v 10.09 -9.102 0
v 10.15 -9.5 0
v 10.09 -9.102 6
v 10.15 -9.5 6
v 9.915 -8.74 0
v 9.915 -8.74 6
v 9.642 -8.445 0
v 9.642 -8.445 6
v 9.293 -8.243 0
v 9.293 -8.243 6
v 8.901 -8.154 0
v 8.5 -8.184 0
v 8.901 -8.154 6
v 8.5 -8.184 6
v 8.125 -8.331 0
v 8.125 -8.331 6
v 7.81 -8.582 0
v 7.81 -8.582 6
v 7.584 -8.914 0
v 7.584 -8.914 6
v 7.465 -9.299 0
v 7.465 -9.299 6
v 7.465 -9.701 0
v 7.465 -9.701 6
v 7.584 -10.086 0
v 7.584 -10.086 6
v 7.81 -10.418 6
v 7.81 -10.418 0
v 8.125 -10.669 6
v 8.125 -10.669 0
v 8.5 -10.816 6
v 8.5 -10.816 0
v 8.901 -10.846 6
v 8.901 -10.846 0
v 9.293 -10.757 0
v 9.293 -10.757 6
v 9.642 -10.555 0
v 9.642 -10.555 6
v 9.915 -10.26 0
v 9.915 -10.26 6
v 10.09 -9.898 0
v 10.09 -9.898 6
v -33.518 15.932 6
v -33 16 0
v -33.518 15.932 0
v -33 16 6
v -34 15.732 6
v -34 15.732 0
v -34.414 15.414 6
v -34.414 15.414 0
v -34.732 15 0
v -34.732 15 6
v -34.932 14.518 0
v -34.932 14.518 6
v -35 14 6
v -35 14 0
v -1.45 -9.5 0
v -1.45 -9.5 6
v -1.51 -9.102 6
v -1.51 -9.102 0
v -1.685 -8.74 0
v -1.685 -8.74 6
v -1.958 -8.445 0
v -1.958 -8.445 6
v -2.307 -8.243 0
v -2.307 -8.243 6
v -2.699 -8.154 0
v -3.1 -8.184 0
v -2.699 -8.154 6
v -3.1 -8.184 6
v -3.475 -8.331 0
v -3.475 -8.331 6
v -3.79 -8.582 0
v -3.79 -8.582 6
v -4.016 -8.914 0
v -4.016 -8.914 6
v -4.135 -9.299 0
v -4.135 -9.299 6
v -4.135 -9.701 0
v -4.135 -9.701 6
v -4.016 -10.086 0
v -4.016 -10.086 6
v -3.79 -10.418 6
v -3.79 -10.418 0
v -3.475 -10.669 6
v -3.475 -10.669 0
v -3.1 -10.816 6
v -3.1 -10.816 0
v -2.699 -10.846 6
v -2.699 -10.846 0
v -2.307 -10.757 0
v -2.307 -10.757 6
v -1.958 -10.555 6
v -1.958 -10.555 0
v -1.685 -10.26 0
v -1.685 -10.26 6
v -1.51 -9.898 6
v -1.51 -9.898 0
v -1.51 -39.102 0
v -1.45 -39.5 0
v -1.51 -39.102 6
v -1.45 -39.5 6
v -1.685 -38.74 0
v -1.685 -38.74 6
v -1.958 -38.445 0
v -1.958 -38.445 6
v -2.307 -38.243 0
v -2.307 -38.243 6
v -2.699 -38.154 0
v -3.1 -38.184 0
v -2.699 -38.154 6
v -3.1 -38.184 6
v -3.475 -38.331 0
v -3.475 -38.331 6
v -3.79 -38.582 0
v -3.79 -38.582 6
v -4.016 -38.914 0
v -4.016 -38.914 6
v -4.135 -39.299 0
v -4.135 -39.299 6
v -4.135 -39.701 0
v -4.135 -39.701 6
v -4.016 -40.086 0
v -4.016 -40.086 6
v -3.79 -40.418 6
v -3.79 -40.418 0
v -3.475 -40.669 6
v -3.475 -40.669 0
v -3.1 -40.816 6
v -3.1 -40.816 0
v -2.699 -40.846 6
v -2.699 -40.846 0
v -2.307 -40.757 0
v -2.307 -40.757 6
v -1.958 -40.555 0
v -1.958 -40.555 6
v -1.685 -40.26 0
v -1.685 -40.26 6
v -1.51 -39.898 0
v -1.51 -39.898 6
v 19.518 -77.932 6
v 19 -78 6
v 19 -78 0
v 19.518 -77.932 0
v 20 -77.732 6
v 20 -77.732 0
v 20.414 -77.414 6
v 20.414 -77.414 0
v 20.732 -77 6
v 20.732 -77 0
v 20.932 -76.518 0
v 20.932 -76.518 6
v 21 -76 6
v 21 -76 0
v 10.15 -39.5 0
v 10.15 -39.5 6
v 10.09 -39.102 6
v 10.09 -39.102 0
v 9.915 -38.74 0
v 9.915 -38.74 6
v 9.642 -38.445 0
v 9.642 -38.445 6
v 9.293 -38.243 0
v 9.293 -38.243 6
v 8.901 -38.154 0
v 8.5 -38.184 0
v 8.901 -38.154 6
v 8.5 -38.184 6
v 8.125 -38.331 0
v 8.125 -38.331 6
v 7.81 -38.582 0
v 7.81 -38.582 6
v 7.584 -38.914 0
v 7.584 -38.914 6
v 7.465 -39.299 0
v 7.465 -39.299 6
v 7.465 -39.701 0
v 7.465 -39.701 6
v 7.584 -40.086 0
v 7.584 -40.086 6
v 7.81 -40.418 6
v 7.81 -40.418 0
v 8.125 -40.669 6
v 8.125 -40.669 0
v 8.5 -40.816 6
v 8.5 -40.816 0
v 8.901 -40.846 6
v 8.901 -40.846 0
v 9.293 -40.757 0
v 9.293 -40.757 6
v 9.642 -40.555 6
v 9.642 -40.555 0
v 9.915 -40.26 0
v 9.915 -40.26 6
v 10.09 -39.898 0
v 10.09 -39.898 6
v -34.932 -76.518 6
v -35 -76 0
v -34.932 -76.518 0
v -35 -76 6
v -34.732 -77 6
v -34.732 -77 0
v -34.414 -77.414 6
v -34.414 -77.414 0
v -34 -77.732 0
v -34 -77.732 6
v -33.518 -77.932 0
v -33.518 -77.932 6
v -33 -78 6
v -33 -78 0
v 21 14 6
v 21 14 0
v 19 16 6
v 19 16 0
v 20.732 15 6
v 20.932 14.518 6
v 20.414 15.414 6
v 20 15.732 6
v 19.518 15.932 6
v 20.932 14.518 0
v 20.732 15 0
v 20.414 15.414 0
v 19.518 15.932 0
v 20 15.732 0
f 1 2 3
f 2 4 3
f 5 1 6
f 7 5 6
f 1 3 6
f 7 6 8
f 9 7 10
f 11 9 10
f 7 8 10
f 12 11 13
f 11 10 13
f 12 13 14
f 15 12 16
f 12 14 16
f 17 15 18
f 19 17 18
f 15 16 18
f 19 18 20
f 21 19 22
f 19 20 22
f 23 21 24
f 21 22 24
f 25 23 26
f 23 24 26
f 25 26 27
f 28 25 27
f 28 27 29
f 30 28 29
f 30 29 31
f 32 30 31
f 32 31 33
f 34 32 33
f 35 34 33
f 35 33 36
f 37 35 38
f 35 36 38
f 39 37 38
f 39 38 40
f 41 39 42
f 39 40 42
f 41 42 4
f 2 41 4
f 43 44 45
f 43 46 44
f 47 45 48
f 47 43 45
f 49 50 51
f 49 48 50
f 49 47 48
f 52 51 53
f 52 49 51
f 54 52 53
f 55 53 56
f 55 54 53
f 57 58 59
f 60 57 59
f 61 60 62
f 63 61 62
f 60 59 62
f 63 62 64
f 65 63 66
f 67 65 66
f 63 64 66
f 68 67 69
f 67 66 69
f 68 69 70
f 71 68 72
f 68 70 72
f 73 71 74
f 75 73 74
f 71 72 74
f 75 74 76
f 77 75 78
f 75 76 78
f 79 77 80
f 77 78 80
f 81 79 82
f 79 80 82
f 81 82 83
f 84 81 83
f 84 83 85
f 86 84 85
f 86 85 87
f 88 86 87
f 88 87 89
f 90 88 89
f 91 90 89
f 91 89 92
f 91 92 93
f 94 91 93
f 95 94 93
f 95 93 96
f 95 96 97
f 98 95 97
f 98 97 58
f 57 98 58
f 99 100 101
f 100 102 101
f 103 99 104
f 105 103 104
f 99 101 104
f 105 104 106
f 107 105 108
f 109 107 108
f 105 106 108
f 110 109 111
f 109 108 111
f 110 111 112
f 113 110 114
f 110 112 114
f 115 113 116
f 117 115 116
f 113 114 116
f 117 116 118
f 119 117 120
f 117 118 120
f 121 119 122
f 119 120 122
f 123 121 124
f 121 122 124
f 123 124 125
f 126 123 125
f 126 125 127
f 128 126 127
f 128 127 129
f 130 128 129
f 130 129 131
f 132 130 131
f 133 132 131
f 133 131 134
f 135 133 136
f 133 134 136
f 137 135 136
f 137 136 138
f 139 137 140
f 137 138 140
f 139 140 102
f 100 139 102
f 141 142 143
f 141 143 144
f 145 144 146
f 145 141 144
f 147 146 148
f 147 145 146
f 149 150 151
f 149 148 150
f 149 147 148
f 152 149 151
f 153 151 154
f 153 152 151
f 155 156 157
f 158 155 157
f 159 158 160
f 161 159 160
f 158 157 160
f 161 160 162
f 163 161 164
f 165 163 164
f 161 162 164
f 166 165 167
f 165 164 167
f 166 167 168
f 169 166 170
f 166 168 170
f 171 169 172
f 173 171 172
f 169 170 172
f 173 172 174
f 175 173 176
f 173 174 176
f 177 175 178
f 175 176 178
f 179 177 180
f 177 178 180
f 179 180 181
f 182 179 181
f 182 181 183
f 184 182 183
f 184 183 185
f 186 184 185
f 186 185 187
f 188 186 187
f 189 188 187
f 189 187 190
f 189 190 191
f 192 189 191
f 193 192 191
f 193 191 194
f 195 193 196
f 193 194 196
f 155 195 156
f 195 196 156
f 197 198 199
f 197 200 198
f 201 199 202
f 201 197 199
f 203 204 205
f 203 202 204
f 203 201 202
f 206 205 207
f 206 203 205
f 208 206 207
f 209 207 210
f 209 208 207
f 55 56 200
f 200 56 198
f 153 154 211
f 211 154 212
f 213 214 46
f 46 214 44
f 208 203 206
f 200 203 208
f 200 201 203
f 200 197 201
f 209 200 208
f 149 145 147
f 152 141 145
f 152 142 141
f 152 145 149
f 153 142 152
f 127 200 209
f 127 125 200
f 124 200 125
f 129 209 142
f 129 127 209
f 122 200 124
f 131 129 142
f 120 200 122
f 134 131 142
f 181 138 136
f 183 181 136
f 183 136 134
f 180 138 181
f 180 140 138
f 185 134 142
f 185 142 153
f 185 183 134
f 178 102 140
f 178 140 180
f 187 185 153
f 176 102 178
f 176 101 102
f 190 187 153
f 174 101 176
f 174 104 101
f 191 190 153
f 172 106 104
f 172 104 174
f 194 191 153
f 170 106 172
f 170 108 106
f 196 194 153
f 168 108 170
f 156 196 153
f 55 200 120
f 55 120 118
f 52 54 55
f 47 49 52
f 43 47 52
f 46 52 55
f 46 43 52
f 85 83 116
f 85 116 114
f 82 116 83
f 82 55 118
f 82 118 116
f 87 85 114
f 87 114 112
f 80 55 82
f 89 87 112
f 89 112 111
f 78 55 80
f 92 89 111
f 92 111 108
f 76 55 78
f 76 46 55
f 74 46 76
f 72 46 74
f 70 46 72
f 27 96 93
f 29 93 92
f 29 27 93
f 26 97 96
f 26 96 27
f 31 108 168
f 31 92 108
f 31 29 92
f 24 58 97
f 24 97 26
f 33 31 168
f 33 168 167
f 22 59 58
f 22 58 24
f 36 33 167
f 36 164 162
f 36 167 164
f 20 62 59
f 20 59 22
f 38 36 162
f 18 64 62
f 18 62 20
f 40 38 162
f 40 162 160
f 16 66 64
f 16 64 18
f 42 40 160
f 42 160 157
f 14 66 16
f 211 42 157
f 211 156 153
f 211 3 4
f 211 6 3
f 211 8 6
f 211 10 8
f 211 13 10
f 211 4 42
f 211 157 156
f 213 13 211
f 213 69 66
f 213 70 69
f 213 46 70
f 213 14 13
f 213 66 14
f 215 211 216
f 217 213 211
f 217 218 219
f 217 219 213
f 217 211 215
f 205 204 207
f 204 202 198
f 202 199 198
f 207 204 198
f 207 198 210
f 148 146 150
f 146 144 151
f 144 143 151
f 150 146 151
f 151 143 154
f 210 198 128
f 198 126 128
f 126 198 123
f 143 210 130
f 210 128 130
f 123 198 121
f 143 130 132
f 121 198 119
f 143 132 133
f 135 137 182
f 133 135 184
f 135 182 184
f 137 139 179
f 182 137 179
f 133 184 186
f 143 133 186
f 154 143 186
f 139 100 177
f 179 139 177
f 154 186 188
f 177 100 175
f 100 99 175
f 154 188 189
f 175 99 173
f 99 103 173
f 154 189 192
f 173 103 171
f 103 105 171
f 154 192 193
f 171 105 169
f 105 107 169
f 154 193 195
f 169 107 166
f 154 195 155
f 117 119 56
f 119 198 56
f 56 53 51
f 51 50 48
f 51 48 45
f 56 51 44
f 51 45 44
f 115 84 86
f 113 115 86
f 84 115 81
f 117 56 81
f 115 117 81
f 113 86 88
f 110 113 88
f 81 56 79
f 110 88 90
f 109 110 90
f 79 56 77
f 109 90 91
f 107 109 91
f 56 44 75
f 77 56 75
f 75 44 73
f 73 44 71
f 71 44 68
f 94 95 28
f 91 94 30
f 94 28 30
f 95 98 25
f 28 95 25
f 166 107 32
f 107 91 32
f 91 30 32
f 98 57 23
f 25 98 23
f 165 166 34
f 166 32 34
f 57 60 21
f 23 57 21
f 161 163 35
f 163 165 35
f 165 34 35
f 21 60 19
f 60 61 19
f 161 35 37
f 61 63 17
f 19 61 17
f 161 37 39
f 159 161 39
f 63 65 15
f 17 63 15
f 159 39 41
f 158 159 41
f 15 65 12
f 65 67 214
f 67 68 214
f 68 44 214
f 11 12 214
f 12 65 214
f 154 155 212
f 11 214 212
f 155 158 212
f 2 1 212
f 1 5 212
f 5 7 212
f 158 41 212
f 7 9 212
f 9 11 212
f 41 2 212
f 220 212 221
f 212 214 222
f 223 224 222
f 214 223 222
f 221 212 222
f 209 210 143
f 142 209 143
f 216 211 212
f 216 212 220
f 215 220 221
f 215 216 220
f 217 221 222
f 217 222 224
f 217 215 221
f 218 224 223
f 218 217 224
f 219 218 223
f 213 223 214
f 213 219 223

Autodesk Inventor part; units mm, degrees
ref_plane "YZ Plane" through (0, 0, 0) normal (1, 0, 0) x (0, 1, 0)
ref_plane "XZ Plane" through (0, 0, 0) normal (0, 1, 0) x (-1, 0, 0)
ref_plane "XY Plane" through (0, 0, 0) normal (0, 0, 1) x (1, 0, 0)
sketch "스케치1" plane through (0, 0, 0) normal (0, 0, 1) x (1, 0, 0)
  circle A0 centre (11, 3) radius 1.35 projected
  circle A1 centre (-5, 3) radius 1.35 projected
  line L0 (0, 0) -> (6, 0) projected
  line L1 (6, 0) -> (6, 6) projected
  line L2 (0, 6) -> (6, 6) projected
  line L3 (0, 0) -> (0, 6) projected
  circle A2 centre (11, -53.9) radius 1.35 projected
  circle A3 centre (-5, -53.9) radius 1.35 projected
  line L4 (0, -56.9) -> (6, -56.9) projected
  line L5 (6, -56.9) -> (6, -50.9) projected
  line L6 (0, -50.9) -> (6, -50.9) projected
  line L7 (0, -56.9) -> (0, -50.9) projected
  line L8 (21, 16) -> (-35, 16)
  line L9 (-35, 16) -> (-35, -78)
  line L10 (-35, -78) -> (21, -78)
  line L11 (21, -78) -> (21, 16)
  circle A4 centre (11, 3) radius 1.35
  circle A5 centre (-5, 3) radius 1.35
  circle A6 centre (11, -53.9) radius 1.35
  circle A7 centre (-5, -53.9) radius 1.35
  line L12 (-0.05, 6.05) -> (6.05, 6.05)
  line L13 (6.05, 6.05) -> (6.05, -0.05)
  line L14 (6.05, -0.05) -> (-0.05, -0.05)
  line L15 (-0.05, -0.05) -> (-0.05, 6.05)
  line L16 (-0.05, 6.05) -> (6.05, -0.05) construction
  line L17 (6.05, 6.05) -> (-0.05, -0.05) construction
  line L18 (-0.05, -50.85) -> (6.05, -50.85)
  line L19 (6.05, -50.85) -> (6.05, -56.95)
  line L20 (6.05, -56.95) -> (-0.05, -56.95)
  line L21 (-0.05, -56.95) -> (-0.05, -50.85)
  line L22 (-0.05, -50.85) -> (6.05, -56.95) construction
  line L23 (6.05, -50.85) -> (-0.05, -56.95) construction
  point P0 (3, 3)
  point P1 (3, -53.9)
  dimension "d0" = 56
  dimension "d1" = 94
  dimension "d2" = 2.7
  dimension "d3" = 2.7
  dimension "d4" = 2.7
  dimension "d5" = 2.7
  dimension "d6" = 6.1
  dimension "d7" = 6.1
  dimension "d8" = 6.1
  dimension "d9" = 6.1
extrude "돌출1" add sketch "스케치1" along normal blind 6 contours L11 L10 L9 L8
fillet "모깎기1" radius 2 4 edges at (-35, 16, 3) (21, 16, 3) (-35, -78, 3) (21, -78, 3)
sketch "스케치3" plane through (0, 0, 6) normal (0, 0, 1) x (1, 0, 0)
  line L0 (-0.05, 6.05) -> (6.05, 6.05) projected
  line L1 (6.05, 6.05) -> (6.05, -0.05) projected
  line L2 (-0.05, -0.05) -> (-0.05, 6.05) projected
  line L3 (6.05, -0.05) -> (-0.05, -0.05) projected
  line L4 (-2.05, -0.05) -> (8.05, -0.05)
  line L5 (8.05, -0.05) -> (8.05, 6.05)
  line L6 (8.05, 6.05) -> (-2.05, 6.05)
  line L7 (-2.05, 6.05) -> (-2.05, -0.05)
  line L8 (-2.05, -0.05) -> (8.05, 6.05) construction
  line L9 (8.05, -0.05) -> (-2.05, 6.05) construction
  line L10 (-0.05, -50.85) -> (6.05, -50.85) projected
  line L11 (6.05, -50.85) -> (6.05, -56.95) projected
  line L12 (-0.05, -56.95) -> (-0.05, -50.85) projected
  line L13 (6.05, -56.95) -> (-0.05, -56.95) projected
  line L14 (-2.05, -56.95) -> (8.05, -56.95)
  line L15 (8.05, -56.95) -> (8.05, -50.85)
  line L16 (8.05, -50.85) -> (-2.05, -50.85)
  line L17 (-2.05, -50.85) -> (-2.05, -56.95)
  line L18 (-2.05, -56.95) -> (8.05, -50.85) construction
  line L19 (8.05, -56.95) -> (-2.05, -50.85) construction
  point P0 (0, 0)
  point P1 (3, 3)
  point P2 (3, -53.9)
  dimension "d13" = 10.1
  dimension "d14" = 10.1
  dimension "d15" = 6.1
extrude "돌출2" cut sketch "스케치3" against normal blind 10
sketch "스케치4" plane through (0, 0, 6) normal (0, 0, 1) x (1, 0, 0)
  line L0 (-2.05, 6.05) -> (8.05, 6.05) projected
  line L1 (8.05, 6.05) -> (8.05, -0.05) projected
  line L2 (-2.05, -0.05) -> (-2.05, 6.05) projected
  line L3 (8.05, -0.05) -> (-2.05, -0.05) projected
  line L4 (-2.05, -50.85) -> (8.05, -50.85) projected
  line L5 (8.05, -50.85) -> (8.05, -56.95) projected
  line L6 (8.05, -56.95) -> (-2.05, -56.95) projected
  line L7 (-2.05, -56.95) -> (-2.05, -50.85) projected
  circle A0 centre (-2.05, 6.05) radius 1
  circle A1 centre (8.05, 6.05) radius 1
  circle A2 centre (8.05, -0.05) radius 1
  circle A3 centre (-2.05, -0.05) radius 1
  circle A4 centre (-2.05, -50.85) radius 1
  circle A5 centre (8.05, -50.85) radius 1
  circle A6 centre (8.05, -56.95) radius 1
  circle A7 centre (-2.05, -56.95) radius 1
  point P0 (0, 0)
  dimension "d18" = 2
  dimension "d19" = 2
  dimension "d20" = 2
  dimension "d21" = 2
  dimension "d22" = 2
  dimension "d23" = 2
  dimension "d24" = 2
  dimension "d25" = 2
extrude "돌출3" cut sketch "스케치4" against normal blind 10 contours L2 A0 L0 | L0 A0 L2 | A1 L1 L0 | L0 L1 A1 | A3 L3 L2 | L2 L3 A3 | A2 L3 L1 | L1 L3 A2 | L7 A4 L4 | L4 A4 L7 | A5 L5 L4 | L4 L5 A5 | A7 L6 L7 | L7 L6 A7 | A6 L6 L5 | L5 L6 A6
sketch "스케치5" plane through (0, 0, 6) normal (0, 0, 1) x (1, 0, 0)
  line L0 (-1.05, 6.05) -> (7.05, 6.05) projected
  line L1 (8.05, 5.05) -> (8.05, 0.95) projected
  circle A0 centre (-2.8, -9.5) radius 1.35
  circle A1 centre (8.8, -9.5) radius 1.35
  circle A2 centre (-2.8, -39.5) radius 1.35
  circle A3 centre (8.8, -39.5) radius 1.35
  point P0 (0, 0)
  dimension "d32" = 2.7
  dimension "d33" = 2.7
  dimension "d34" = 2.7
  dimension "d35" = 2.7
extrude "돌출4" cut sketch "스케치5" against normal blind 10
sketch "스케치6" plane through (0, 0, 6) normal (0, 0, 1) x (1, 0, 0)
  line L0 (-11.1766, 9.439) -> (14.0881, 9.439)
  line L1 (14.0881, 9.439) -> (14.0881, -4.9308)
  line L2 (14.0881, -4.9308) -> (-11.1766, -4.9308)
  line L3 (-11.1766, -4.9308) -> (-11.1766, 9.439)
  line L4 (-9.3673, -48.6772) -> (15.6068, -48.6772)
  line L5 (15.6068, -48.6772) -> (15.6068, -64.9024)
  line L6 (15.6068, -64.9024) -> (-9.3673, -64.9024)
  line L7 (-9.3673, -64.9024) -> (-9.3673, -48.6772)
  point P0 (0, 0)
extrude "돌출5" add sketch "스케치6" against normal blind 6
properties part number "foot_ver2" material "PMMA 플라스틱"
